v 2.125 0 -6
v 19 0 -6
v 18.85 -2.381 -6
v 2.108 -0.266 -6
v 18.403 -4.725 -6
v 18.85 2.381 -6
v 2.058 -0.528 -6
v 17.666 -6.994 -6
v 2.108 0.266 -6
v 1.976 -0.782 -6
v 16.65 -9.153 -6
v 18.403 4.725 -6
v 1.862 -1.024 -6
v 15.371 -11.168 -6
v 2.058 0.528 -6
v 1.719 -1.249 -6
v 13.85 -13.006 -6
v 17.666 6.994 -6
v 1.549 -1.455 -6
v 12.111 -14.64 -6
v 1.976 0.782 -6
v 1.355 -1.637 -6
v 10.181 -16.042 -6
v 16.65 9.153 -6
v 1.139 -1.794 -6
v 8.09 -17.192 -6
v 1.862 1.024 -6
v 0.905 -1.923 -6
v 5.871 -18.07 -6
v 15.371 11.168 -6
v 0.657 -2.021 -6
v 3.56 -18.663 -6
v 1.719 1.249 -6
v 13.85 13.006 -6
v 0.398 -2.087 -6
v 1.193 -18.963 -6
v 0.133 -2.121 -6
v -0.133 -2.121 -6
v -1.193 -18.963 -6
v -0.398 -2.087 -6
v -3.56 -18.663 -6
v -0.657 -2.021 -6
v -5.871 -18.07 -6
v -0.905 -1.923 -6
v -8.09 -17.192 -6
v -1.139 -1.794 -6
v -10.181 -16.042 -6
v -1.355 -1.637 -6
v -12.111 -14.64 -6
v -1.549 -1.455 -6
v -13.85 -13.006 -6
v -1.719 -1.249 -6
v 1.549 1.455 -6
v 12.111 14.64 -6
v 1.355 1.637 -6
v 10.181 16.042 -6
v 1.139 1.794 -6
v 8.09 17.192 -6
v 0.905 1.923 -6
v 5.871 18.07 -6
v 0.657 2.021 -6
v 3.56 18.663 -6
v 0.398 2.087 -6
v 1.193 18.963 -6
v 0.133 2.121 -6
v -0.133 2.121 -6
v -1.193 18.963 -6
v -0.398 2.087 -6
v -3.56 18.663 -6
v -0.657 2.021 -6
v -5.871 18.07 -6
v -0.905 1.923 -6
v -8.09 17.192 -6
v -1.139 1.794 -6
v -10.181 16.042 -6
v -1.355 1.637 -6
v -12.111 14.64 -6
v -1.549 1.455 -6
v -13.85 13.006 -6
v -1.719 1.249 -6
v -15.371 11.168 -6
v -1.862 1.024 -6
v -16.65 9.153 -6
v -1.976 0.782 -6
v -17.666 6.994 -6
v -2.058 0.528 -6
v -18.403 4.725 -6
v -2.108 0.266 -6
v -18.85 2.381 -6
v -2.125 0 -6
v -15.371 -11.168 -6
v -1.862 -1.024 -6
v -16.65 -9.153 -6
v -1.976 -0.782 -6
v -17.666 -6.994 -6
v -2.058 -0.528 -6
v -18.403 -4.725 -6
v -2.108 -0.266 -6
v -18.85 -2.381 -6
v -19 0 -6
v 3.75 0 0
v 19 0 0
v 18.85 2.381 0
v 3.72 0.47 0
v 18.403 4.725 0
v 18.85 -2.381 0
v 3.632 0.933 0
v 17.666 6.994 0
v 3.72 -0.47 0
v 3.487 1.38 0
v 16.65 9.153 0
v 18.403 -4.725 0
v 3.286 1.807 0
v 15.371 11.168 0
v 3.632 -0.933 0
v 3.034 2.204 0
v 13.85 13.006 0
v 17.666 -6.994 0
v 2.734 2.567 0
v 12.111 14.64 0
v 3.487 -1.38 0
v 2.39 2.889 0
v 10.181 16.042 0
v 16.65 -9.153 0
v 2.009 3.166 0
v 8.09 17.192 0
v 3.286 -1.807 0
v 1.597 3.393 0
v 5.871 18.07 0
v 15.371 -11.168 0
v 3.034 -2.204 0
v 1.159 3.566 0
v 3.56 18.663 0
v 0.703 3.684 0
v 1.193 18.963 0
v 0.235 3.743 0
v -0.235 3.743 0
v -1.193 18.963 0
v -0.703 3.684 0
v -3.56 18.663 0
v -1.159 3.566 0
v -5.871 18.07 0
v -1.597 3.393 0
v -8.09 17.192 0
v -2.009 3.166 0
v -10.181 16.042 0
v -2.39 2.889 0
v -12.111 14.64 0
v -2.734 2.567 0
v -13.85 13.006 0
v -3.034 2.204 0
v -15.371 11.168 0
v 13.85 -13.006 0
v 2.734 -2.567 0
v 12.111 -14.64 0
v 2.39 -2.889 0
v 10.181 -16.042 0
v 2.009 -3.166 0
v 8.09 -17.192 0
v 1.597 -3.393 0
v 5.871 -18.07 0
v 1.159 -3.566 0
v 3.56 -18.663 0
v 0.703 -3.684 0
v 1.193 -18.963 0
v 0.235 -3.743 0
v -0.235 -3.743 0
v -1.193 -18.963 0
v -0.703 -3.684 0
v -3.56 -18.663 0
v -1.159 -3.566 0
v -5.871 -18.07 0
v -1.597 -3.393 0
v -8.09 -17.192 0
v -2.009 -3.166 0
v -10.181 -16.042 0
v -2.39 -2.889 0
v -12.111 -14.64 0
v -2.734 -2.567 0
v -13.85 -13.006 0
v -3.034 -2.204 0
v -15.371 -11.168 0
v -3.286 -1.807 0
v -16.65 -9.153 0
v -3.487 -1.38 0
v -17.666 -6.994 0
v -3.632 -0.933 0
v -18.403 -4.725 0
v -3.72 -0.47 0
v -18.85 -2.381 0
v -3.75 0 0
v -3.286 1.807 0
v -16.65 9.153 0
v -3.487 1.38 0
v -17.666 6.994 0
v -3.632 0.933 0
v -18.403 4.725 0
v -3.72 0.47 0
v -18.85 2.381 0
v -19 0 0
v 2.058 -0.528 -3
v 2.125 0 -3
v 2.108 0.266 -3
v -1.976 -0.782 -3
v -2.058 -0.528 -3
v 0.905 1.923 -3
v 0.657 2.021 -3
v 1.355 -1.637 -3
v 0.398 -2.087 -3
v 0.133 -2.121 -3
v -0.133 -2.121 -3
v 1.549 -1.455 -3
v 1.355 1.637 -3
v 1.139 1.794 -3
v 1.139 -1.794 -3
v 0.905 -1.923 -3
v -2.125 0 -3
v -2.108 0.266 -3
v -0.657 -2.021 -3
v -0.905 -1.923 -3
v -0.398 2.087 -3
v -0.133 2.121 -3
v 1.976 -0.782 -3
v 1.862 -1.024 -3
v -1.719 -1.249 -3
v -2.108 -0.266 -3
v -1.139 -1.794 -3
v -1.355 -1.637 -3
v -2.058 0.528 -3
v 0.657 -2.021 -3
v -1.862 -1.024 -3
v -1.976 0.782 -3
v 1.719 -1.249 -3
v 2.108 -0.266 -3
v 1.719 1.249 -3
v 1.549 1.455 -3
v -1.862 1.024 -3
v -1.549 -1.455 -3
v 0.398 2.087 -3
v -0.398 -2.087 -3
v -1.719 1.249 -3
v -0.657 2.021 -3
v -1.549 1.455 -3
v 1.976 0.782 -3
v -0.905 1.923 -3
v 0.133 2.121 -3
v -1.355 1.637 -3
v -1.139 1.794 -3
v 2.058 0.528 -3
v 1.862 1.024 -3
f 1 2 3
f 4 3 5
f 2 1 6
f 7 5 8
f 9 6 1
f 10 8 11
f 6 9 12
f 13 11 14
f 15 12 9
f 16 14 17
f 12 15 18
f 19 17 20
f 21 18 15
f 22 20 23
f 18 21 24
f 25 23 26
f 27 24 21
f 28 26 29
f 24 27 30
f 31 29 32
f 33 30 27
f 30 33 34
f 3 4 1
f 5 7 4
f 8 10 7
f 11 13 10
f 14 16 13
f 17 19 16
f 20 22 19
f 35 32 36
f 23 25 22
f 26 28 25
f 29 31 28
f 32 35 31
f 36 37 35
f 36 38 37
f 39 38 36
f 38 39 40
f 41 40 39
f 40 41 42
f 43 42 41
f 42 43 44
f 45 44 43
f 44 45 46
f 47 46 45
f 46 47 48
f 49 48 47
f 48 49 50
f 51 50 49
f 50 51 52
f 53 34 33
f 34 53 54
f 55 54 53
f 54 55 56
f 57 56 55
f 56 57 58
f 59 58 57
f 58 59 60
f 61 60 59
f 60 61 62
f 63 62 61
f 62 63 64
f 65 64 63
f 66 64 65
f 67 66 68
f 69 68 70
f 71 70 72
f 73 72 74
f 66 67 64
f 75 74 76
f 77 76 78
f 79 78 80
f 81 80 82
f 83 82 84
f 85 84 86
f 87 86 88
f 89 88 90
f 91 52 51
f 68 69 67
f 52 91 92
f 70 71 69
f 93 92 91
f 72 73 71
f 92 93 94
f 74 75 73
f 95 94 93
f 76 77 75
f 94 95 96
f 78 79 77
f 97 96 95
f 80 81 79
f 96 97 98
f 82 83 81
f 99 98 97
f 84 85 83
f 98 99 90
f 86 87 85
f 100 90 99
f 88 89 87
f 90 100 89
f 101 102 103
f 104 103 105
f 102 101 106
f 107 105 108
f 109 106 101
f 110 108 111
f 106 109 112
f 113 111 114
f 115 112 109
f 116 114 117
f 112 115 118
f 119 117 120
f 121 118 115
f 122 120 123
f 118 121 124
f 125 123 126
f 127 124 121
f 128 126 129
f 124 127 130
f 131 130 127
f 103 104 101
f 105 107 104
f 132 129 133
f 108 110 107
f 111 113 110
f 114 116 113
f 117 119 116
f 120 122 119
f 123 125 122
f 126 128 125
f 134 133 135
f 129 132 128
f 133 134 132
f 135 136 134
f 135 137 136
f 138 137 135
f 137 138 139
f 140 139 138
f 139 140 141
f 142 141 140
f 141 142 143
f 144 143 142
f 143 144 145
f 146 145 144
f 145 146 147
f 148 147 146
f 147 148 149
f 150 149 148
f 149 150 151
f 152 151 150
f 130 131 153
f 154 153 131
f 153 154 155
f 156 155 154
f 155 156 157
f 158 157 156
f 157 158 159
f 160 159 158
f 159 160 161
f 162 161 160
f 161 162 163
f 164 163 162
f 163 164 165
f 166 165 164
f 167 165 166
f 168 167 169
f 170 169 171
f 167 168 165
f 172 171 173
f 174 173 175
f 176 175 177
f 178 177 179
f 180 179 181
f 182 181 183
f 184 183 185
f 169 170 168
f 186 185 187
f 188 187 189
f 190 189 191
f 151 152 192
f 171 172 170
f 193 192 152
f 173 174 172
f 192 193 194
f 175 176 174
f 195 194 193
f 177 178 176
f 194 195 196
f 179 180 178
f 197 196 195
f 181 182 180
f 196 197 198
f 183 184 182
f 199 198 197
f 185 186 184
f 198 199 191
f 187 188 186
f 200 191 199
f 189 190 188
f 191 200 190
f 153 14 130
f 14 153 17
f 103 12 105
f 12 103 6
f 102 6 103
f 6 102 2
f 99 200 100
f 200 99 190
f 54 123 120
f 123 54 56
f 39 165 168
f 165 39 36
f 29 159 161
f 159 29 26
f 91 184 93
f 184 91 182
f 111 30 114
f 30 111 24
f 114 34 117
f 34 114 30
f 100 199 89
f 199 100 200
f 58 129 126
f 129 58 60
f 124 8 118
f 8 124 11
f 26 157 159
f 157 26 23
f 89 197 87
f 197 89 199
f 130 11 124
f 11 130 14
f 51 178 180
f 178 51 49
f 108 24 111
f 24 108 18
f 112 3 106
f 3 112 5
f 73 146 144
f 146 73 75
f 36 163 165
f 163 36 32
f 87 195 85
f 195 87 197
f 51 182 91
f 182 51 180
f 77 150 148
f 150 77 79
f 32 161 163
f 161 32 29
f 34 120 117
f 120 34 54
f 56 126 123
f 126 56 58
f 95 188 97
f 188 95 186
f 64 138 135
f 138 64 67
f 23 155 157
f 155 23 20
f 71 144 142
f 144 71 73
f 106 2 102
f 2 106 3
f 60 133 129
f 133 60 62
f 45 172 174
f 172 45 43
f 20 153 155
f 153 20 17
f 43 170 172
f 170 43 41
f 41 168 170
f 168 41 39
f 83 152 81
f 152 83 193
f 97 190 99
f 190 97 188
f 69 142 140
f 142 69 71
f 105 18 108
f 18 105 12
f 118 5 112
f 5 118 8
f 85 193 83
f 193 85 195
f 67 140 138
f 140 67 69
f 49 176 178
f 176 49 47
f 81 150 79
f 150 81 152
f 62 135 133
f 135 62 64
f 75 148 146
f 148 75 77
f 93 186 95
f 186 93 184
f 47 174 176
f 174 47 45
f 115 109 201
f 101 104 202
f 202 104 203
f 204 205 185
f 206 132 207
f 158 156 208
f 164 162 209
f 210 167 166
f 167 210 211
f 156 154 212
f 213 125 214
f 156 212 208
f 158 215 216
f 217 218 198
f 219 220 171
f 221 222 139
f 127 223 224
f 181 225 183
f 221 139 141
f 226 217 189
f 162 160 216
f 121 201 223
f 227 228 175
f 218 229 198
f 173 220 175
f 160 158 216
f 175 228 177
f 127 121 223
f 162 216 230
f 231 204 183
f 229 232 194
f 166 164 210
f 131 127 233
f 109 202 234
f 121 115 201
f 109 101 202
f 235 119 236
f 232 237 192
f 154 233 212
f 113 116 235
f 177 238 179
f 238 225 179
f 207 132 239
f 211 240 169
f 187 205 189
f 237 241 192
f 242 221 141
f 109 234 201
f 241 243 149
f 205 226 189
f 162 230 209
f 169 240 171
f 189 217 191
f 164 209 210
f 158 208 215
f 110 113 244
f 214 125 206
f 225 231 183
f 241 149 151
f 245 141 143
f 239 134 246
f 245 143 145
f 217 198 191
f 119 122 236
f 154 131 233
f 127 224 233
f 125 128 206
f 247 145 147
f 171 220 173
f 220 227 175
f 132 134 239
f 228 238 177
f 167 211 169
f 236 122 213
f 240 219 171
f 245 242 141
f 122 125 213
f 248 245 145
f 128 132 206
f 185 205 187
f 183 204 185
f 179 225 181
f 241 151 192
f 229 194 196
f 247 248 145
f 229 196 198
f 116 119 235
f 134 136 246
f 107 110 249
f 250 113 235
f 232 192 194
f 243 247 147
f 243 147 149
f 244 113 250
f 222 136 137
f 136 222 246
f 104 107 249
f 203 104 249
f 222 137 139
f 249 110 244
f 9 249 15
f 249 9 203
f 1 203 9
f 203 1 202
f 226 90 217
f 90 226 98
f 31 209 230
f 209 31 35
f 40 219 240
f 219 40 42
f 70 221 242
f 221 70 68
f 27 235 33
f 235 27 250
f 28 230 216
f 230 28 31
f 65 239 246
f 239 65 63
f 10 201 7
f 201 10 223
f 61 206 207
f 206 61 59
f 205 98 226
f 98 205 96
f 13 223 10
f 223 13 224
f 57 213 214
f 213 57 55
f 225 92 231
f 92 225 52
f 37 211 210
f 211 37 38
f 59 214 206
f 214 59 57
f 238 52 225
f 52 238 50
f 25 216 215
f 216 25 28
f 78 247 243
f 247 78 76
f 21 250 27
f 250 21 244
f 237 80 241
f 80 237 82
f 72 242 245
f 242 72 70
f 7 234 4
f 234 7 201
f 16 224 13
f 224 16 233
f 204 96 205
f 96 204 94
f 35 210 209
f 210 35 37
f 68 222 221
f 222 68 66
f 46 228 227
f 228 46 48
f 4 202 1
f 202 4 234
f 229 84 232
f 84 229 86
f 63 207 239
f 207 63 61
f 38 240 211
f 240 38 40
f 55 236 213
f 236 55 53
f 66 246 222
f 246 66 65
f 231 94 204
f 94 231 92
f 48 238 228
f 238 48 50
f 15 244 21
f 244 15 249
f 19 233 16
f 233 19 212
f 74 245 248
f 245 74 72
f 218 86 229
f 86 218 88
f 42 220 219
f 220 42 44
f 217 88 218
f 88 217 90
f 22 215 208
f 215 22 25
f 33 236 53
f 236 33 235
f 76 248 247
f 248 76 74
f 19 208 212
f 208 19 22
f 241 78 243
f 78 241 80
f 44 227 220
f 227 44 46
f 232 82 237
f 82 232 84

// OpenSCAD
$fn = 50;


difference() {
	union() {
		translate(v = [0, 0, -6.0000000000]) {
			cylinder(h = 6, r = 10.0000000000);
		}
		translate(v = [0, 0, -6.0000000000]) {
			cylinder(h = 6, r = 19.0000000000);
		}
	}
	union() {
		translate(v = [0, 0, 0]) {
			rotate(a = [0, 0, 0]) {
				difference() {
					union() {
						#translate(v = [0, 0, -6.0000000000]) {
							cylinder(h = 6, r = 2.0000000000);
						}
						#translate(v = [0, 0, -3]) {
							cylinder(h = 3, r = 10.0000000000, r1 = 2.1250000000, r2 = 3.7500000000);
						}
						#translate(v = [0, 0, -6.0000000000]) {
							cylinder(h = 6, r = 2.1250000000);
						}
						#translate(v = [0, 0, -6.0000000000]) {
							cylinder(h = 6, r = 2.0000000000);
						}
					}
					union();
				}
			}
		}
	}
}
